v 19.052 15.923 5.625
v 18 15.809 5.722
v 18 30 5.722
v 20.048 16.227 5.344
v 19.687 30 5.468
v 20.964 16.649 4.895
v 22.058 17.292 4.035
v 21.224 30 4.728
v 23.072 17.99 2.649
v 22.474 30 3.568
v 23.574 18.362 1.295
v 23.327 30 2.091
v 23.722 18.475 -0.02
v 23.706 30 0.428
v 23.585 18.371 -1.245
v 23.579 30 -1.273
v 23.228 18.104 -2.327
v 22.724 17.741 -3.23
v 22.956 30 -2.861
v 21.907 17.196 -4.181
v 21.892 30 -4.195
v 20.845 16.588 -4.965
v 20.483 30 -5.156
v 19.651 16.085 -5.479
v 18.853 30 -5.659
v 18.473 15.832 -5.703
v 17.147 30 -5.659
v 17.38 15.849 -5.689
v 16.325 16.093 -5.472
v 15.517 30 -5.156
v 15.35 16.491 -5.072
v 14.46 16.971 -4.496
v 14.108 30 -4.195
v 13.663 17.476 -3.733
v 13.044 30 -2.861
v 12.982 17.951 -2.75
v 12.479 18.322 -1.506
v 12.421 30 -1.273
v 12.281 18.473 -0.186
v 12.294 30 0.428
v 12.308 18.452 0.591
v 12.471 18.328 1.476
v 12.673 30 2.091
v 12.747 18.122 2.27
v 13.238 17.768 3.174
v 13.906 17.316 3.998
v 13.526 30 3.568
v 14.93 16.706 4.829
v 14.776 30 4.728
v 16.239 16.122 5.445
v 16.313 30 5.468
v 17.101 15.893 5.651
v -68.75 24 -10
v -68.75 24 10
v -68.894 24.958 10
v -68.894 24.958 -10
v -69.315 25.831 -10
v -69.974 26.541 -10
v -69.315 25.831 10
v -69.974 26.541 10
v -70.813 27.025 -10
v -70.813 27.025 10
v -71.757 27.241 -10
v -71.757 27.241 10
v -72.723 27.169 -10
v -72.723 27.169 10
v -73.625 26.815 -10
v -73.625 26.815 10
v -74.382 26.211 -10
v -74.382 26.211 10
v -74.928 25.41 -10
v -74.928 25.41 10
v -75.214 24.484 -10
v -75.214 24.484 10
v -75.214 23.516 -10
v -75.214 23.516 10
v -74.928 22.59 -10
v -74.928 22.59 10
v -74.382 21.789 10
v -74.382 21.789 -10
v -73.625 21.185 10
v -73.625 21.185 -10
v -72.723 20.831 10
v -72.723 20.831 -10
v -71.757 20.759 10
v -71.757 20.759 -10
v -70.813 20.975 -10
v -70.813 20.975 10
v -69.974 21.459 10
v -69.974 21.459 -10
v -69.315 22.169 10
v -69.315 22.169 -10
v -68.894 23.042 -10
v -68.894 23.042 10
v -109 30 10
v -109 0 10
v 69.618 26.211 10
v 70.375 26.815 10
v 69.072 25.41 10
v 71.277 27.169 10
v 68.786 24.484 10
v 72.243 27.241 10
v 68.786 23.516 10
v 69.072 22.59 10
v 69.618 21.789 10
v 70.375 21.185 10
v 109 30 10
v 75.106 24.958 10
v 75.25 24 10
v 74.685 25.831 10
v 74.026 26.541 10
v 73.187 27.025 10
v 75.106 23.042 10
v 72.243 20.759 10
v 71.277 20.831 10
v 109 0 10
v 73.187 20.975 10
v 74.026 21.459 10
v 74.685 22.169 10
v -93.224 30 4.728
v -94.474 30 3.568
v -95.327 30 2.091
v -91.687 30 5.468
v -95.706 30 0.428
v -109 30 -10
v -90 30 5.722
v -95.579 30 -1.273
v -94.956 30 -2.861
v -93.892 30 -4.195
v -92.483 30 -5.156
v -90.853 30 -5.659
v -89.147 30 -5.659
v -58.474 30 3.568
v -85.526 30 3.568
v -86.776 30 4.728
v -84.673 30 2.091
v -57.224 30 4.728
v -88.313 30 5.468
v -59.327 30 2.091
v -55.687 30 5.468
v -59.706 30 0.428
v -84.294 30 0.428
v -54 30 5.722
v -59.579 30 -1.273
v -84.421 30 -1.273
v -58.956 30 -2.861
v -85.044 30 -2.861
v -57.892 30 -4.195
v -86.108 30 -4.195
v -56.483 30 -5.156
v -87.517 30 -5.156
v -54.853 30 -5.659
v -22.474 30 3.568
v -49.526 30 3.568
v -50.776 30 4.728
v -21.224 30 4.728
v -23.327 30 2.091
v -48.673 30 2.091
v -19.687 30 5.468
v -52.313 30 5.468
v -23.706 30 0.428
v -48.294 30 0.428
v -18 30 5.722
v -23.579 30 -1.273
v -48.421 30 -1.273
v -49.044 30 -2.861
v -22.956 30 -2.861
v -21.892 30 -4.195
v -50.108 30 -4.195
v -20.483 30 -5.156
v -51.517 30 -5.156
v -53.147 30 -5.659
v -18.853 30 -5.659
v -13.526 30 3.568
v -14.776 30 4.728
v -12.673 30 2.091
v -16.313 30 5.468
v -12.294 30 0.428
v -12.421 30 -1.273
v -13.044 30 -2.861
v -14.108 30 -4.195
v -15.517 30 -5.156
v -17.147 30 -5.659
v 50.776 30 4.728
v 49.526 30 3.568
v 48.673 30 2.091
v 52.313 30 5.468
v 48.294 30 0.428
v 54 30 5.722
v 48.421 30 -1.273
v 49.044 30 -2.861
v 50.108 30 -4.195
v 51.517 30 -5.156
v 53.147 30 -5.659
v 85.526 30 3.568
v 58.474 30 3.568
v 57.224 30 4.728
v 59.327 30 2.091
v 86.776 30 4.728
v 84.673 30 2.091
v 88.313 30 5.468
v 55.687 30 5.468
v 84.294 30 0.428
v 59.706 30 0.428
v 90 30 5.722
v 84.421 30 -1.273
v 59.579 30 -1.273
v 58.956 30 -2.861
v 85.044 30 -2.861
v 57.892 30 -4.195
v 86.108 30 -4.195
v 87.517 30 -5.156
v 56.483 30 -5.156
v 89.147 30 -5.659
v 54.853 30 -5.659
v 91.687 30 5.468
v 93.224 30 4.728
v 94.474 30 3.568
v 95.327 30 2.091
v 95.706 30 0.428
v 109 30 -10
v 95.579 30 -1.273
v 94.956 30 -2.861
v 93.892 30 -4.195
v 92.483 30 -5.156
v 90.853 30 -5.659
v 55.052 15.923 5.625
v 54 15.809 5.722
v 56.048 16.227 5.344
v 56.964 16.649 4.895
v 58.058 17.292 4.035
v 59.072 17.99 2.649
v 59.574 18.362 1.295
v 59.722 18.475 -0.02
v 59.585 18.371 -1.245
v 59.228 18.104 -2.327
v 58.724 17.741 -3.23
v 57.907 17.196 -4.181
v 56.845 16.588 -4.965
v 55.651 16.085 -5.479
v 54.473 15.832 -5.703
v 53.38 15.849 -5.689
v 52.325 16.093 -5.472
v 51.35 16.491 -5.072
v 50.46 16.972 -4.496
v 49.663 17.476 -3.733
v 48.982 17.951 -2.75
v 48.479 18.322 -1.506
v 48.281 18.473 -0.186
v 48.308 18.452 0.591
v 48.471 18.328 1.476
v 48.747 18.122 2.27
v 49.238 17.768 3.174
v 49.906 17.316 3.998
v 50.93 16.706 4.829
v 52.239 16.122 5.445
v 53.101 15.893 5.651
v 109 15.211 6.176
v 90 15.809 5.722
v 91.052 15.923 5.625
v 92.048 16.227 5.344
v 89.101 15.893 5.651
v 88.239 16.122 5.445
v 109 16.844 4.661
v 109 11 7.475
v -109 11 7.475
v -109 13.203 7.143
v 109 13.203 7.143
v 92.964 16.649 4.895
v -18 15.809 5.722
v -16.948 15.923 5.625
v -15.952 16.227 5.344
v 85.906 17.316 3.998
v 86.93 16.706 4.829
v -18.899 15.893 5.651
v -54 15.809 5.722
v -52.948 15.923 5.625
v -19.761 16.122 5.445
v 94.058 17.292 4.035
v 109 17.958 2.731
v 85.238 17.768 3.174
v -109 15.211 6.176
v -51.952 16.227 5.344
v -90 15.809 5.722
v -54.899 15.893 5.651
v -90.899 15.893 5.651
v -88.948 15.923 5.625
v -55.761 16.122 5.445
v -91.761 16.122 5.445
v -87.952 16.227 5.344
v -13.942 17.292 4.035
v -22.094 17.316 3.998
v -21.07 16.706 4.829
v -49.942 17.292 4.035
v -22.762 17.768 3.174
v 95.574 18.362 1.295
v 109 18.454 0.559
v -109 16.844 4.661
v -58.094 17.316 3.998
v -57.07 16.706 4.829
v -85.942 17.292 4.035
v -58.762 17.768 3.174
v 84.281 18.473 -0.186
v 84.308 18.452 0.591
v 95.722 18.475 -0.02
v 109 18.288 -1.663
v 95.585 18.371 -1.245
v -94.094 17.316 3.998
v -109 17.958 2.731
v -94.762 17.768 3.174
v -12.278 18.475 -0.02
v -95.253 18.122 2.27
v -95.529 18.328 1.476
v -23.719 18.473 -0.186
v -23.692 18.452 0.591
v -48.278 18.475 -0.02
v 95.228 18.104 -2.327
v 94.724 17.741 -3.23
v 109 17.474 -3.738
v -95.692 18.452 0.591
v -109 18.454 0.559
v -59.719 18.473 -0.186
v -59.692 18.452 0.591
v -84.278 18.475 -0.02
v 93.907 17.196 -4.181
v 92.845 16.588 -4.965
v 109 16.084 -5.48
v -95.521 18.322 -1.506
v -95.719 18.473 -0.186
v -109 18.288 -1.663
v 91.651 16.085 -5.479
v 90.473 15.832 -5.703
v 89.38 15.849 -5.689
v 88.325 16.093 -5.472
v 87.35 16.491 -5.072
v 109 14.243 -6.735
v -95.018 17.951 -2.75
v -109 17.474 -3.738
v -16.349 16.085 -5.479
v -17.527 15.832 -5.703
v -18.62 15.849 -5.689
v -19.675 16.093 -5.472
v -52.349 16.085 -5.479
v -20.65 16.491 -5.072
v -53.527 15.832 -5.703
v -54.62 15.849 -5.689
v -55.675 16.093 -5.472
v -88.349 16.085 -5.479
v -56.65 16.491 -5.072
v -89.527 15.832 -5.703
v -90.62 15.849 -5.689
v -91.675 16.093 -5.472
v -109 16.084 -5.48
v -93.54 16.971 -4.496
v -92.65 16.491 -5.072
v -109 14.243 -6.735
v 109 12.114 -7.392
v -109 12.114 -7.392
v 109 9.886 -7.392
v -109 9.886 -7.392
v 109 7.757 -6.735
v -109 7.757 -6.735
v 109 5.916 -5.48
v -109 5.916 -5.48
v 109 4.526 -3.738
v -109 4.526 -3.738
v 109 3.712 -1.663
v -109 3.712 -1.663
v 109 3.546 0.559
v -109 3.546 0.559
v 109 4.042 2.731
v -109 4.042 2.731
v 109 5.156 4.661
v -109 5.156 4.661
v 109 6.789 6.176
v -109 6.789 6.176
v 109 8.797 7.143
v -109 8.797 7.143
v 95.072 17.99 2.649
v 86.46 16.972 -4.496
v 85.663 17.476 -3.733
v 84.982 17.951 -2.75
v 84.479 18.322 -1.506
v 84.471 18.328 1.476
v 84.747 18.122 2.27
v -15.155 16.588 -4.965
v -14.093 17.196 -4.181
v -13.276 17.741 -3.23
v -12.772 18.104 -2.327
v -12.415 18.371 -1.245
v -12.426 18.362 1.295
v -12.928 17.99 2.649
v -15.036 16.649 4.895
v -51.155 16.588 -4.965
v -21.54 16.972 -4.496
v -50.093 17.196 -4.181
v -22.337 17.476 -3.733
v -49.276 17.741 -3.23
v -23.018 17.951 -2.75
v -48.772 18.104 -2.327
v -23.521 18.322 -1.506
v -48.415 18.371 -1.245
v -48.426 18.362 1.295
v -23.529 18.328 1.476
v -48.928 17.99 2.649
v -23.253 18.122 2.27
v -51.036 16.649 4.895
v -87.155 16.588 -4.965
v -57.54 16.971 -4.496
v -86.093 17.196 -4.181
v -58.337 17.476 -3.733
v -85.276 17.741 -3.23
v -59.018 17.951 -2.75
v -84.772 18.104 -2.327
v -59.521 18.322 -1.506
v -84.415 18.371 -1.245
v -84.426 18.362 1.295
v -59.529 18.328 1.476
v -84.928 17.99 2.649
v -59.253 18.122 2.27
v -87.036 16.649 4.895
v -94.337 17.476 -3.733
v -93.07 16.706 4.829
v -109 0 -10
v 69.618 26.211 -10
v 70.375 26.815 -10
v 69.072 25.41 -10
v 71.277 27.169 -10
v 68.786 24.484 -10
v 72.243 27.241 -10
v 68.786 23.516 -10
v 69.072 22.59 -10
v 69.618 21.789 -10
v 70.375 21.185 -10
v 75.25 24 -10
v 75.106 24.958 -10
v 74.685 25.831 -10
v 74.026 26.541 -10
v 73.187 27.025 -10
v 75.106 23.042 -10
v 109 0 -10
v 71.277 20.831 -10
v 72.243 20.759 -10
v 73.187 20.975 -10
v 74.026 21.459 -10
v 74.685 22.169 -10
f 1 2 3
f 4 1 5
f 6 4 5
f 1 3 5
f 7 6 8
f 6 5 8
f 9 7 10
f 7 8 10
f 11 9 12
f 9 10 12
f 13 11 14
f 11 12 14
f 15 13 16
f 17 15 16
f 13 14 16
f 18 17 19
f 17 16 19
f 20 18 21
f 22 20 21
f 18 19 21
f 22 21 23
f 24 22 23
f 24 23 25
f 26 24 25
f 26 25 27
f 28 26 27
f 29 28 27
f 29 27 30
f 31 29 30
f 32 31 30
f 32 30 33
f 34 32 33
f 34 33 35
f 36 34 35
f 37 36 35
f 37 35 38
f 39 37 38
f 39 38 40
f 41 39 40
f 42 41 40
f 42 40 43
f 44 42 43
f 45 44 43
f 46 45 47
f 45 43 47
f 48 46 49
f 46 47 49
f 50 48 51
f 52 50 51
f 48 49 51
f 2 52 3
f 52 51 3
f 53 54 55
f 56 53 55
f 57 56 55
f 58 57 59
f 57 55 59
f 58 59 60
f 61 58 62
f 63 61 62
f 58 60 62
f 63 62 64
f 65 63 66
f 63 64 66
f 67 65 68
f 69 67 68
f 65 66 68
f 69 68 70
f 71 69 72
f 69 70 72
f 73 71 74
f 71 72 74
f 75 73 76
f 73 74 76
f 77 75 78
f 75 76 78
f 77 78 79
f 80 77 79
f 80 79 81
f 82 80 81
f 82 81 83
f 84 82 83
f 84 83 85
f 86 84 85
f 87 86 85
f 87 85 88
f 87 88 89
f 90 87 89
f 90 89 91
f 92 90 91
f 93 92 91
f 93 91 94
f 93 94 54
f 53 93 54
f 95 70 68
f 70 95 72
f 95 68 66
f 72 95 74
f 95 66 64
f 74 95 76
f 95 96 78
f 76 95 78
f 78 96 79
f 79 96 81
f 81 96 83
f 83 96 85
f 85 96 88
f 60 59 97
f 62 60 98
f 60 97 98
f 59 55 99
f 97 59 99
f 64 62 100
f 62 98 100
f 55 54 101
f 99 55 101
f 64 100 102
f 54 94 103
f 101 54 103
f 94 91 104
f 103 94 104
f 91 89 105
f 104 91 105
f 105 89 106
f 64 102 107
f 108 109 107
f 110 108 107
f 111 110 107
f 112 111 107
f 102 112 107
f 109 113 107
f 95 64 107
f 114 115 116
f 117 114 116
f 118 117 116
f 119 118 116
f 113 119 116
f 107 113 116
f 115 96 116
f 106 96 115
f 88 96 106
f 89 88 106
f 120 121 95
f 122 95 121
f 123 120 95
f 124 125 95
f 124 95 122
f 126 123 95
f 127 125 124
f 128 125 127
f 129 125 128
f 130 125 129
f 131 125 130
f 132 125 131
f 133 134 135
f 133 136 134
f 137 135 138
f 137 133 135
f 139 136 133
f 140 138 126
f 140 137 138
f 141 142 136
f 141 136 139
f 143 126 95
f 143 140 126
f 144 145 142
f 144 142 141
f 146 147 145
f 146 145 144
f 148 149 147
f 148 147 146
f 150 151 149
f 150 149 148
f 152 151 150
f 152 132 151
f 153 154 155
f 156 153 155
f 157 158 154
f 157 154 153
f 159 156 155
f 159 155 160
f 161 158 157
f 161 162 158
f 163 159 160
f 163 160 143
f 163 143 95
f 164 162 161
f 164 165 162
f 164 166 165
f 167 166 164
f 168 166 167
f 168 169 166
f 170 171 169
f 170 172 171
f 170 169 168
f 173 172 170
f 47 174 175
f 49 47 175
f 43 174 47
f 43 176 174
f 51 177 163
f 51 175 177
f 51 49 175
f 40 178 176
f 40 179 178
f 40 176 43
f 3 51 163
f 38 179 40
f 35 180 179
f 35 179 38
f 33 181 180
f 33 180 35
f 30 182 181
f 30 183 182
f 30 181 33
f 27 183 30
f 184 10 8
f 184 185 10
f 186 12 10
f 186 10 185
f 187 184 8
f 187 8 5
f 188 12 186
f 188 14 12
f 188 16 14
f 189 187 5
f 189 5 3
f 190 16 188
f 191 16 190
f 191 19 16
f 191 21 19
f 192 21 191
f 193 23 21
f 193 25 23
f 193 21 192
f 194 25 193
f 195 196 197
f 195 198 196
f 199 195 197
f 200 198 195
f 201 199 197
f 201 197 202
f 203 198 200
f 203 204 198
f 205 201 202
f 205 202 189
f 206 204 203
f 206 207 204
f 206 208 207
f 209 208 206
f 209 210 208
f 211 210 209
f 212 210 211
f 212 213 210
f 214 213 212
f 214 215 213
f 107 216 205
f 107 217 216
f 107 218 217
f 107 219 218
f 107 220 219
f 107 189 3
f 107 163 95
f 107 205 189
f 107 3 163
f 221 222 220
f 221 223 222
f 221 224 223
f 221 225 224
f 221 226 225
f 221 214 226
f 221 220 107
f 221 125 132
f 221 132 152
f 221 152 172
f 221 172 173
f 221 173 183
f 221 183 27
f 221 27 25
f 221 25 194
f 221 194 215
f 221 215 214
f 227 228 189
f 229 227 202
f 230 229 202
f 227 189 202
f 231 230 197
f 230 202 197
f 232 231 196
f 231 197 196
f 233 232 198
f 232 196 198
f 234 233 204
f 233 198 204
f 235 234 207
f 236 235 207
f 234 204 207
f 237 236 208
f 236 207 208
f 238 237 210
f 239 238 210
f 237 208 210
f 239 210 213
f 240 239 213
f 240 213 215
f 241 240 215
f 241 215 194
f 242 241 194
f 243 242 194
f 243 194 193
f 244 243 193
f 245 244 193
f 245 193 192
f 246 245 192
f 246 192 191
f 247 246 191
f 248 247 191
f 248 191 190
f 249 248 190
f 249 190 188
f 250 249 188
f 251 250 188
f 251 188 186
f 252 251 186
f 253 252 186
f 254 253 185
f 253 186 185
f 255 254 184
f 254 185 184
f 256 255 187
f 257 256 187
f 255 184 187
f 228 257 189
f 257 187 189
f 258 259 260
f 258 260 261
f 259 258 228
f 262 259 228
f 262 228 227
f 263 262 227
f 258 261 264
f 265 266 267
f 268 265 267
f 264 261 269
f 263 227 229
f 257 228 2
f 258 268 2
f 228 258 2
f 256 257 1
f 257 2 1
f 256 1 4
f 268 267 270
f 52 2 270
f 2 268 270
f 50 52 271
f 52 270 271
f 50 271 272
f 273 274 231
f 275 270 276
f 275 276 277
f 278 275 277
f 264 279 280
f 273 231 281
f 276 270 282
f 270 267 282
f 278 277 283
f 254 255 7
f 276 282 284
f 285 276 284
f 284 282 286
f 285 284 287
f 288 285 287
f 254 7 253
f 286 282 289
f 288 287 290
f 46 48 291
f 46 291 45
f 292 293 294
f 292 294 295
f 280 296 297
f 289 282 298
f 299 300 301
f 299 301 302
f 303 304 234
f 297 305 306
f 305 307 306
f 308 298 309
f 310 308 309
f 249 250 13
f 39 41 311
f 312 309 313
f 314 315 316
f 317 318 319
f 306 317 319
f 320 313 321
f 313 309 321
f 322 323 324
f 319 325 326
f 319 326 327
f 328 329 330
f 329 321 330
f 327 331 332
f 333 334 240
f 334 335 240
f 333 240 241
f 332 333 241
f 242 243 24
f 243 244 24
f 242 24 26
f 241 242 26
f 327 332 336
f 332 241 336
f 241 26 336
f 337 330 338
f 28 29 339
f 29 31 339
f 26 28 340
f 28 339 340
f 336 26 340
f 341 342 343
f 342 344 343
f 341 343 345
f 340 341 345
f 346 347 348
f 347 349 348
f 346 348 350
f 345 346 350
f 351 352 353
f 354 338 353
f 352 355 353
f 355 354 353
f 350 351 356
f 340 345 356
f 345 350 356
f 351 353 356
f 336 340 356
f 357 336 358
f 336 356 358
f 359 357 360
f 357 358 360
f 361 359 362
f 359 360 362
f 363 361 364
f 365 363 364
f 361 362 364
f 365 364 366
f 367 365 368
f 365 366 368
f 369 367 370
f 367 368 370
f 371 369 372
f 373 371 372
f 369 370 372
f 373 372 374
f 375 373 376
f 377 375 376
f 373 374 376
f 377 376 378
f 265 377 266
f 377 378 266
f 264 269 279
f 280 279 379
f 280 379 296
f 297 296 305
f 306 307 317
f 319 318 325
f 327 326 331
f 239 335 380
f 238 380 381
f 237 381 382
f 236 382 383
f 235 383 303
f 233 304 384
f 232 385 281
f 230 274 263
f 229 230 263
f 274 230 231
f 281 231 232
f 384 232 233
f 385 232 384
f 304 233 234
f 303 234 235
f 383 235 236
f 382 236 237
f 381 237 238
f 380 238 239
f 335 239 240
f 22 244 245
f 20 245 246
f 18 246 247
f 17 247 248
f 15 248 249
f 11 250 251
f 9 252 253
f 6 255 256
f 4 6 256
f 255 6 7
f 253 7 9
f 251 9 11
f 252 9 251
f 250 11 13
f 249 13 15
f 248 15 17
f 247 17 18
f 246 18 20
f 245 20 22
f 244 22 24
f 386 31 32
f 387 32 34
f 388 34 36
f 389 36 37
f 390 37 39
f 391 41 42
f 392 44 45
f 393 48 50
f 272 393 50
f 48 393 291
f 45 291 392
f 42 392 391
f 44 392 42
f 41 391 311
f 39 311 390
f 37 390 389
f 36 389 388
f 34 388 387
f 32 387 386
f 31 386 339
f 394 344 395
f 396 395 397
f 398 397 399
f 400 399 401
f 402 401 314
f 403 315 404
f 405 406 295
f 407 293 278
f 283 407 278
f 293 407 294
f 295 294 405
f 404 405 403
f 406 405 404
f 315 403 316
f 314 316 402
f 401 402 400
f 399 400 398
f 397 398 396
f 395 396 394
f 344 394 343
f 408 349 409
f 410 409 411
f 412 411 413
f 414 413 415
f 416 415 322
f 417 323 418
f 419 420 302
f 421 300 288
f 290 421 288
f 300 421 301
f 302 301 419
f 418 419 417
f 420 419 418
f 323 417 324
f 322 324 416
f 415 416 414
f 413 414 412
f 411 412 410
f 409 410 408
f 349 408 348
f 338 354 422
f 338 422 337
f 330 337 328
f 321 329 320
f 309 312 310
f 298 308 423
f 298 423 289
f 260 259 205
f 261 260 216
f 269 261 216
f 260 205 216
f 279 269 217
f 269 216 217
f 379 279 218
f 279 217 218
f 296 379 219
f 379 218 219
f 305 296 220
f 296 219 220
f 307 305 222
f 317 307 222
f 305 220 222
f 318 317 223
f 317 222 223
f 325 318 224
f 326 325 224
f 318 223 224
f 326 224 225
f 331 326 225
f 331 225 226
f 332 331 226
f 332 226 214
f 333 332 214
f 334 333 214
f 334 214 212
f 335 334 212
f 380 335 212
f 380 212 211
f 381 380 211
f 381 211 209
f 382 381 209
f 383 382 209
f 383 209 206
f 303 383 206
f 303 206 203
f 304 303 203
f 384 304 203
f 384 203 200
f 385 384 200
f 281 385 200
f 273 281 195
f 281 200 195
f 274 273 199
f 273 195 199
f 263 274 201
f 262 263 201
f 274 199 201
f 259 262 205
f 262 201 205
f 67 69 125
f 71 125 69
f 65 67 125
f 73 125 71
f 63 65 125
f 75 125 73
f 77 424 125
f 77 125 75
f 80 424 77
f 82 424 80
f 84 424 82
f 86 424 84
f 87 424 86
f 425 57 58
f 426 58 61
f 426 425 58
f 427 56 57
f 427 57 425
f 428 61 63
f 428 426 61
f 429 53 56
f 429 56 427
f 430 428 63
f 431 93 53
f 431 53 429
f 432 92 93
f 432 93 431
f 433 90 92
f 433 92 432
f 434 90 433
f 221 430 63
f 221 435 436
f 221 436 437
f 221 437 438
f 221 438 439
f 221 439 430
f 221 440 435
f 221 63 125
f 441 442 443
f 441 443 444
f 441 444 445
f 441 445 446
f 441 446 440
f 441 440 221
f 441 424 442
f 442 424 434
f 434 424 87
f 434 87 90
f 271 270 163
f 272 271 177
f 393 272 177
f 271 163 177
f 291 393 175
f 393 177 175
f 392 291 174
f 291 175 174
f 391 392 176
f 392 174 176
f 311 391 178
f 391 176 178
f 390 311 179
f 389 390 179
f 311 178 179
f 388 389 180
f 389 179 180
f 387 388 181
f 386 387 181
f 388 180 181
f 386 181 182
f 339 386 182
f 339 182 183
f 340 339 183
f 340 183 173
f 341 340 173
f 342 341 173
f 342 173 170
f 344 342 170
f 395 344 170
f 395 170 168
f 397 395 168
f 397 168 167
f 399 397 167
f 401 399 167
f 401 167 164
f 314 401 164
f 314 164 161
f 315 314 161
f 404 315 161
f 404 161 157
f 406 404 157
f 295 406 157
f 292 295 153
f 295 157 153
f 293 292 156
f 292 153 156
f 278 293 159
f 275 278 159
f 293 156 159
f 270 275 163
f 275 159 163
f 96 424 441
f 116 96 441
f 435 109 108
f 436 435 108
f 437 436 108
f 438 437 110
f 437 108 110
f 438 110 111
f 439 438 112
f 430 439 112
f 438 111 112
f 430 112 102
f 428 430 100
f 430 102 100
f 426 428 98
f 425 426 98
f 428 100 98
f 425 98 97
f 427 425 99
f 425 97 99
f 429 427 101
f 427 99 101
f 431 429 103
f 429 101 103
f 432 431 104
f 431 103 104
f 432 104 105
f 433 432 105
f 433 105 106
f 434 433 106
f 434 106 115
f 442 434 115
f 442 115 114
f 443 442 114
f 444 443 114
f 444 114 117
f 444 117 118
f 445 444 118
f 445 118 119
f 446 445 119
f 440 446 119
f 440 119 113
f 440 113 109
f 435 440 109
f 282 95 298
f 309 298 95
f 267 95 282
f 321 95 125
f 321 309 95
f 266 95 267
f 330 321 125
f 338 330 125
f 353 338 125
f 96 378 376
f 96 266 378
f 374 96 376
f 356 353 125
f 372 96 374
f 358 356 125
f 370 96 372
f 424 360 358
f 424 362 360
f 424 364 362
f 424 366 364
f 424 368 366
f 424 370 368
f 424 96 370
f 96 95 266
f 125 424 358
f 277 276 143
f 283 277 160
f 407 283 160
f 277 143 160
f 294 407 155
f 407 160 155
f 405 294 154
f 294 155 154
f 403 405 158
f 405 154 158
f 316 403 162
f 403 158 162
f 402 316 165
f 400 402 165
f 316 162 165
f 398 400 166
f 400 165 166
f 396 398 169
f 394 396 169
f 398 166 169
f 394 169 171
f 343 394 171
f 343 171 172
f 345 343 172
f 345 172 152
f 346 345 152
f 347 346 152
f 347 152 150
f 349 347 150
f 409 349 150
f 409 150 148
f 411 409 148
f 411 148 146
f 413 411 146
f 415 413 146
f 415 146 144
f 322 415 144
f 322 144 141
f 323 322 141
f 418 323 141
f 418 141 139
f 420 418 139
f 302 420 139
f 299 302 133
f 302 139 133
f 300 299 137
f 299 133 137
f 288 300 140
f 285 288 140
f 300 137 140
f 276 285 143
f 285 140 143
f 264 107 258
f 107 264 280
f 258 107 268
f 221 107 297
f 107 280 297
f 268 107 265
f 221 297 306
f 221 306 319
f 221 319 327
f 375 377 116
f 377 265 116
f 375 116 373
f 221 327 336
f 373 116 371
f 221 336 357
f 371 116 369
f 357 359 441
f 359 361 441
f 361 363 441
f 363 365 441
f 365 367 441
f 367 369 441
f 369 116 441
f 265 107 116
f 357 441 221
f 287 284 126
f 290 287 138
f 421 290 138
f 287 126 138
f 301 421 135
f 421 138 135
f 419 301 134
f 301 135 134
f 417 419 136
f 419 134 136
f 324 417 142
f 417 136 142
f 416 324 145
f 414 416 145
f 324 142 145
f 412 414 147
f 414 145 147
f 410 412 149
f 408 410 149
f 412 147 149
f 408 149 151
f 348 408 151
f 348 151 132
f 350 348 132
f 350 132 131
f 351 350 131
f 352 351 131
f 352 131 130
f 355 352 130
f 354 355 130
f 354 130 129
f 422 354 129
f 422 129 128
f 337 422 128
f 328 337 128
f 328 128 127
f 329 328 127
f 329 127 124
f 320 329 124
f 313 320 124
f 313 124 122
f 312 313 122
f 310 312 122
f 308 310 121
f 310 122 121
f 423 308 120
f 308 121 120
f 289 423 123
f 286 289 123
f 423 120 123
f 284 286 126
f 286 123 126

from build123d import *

# Parameters (mm, degrees)
SKETCH1_W           = 218
SKETCH1_H           = 20
BOSS_EXTRUDE1_DEPTH = 30
SKETCH2_R           = 3.25
CUT_EXTRUDE1_DEPTH  = 30
SKETCH3_R           = 7.475
CUT_EXTRUDE2_DEPTH  = 221.281637909
SKETCH4_R           = 5.7225
CUT_EXTRUDE3_DEPTH  = 15


with BuildPart() as part:
    # Sketch1 → Boss-Extrude1 (new body)
    with BuildSketch(Plane(origin=(0, 0, 0), x_dir=(1, 0, 0), z_dir=(0, 1, 0))):
        Rectangle(SKETCH1_W, SKETCH1_H)
    extrude(amount=BOSS_EXTRUDE1_DEPTH)

    # Sketch2 → Cut-Extrude1 (cut)
    with BuildSketch(Plane.XY.offset(10)):
        with Locations((-72, 24)):
            Circle(SKETCH2_R)
        with Locations((72, 24)):
            Circle(SKETCH2_R)
    extrude(amount=-CUT_EXTRUDE1_DEPTH, mode=Mode.SUBTRACT)

    # Sketch3 → Cut-Extrude2 (cut, through all)
    with BuildSketch(Plane.ZY.offset(109)):
        with Locations((0, 11)):
            Circle(SKETCH3_R)
    extrude(amount=-CUT_EXTRUDE2_DEPTH, mode=Mode.SUBTRACT)

    # Sketch4 → Cut-Extrude3 (cut)
    with BuildSketch(Plane(origin=(0, 30, 0), x_dir=(1, 0, 0), z_dir=(0, 1, 0))):
        with Locations(Location((-90, 0, 0), (0, 0, 270))):
            Circle(SKETCH4_R)
        with Locations(Location((-54, 0, 0), (0, 0, 270))):
            Circle(SKETCH4_R)
        with Locations(Location((-18, 0, 0), (0, 0, 270))):
            Circle(SKETCH4_R)
        with Locations(Location((90, 0, 0), (0, 0, 270))):
            Circle(SKETCH4_R)
        with Locations(Location((18, 0, 0), (0, 0, 270))):
            Circle(SKETCH4_R)
        with Locations(Location((54, 0, 0), (0, 0, 270))):
            Circle(SKETCH4_R)
    extrude(amount=-CUT_EXTRUDE3_DEPTH, mode=Mode.SUBTRACT)


solid = part.part
